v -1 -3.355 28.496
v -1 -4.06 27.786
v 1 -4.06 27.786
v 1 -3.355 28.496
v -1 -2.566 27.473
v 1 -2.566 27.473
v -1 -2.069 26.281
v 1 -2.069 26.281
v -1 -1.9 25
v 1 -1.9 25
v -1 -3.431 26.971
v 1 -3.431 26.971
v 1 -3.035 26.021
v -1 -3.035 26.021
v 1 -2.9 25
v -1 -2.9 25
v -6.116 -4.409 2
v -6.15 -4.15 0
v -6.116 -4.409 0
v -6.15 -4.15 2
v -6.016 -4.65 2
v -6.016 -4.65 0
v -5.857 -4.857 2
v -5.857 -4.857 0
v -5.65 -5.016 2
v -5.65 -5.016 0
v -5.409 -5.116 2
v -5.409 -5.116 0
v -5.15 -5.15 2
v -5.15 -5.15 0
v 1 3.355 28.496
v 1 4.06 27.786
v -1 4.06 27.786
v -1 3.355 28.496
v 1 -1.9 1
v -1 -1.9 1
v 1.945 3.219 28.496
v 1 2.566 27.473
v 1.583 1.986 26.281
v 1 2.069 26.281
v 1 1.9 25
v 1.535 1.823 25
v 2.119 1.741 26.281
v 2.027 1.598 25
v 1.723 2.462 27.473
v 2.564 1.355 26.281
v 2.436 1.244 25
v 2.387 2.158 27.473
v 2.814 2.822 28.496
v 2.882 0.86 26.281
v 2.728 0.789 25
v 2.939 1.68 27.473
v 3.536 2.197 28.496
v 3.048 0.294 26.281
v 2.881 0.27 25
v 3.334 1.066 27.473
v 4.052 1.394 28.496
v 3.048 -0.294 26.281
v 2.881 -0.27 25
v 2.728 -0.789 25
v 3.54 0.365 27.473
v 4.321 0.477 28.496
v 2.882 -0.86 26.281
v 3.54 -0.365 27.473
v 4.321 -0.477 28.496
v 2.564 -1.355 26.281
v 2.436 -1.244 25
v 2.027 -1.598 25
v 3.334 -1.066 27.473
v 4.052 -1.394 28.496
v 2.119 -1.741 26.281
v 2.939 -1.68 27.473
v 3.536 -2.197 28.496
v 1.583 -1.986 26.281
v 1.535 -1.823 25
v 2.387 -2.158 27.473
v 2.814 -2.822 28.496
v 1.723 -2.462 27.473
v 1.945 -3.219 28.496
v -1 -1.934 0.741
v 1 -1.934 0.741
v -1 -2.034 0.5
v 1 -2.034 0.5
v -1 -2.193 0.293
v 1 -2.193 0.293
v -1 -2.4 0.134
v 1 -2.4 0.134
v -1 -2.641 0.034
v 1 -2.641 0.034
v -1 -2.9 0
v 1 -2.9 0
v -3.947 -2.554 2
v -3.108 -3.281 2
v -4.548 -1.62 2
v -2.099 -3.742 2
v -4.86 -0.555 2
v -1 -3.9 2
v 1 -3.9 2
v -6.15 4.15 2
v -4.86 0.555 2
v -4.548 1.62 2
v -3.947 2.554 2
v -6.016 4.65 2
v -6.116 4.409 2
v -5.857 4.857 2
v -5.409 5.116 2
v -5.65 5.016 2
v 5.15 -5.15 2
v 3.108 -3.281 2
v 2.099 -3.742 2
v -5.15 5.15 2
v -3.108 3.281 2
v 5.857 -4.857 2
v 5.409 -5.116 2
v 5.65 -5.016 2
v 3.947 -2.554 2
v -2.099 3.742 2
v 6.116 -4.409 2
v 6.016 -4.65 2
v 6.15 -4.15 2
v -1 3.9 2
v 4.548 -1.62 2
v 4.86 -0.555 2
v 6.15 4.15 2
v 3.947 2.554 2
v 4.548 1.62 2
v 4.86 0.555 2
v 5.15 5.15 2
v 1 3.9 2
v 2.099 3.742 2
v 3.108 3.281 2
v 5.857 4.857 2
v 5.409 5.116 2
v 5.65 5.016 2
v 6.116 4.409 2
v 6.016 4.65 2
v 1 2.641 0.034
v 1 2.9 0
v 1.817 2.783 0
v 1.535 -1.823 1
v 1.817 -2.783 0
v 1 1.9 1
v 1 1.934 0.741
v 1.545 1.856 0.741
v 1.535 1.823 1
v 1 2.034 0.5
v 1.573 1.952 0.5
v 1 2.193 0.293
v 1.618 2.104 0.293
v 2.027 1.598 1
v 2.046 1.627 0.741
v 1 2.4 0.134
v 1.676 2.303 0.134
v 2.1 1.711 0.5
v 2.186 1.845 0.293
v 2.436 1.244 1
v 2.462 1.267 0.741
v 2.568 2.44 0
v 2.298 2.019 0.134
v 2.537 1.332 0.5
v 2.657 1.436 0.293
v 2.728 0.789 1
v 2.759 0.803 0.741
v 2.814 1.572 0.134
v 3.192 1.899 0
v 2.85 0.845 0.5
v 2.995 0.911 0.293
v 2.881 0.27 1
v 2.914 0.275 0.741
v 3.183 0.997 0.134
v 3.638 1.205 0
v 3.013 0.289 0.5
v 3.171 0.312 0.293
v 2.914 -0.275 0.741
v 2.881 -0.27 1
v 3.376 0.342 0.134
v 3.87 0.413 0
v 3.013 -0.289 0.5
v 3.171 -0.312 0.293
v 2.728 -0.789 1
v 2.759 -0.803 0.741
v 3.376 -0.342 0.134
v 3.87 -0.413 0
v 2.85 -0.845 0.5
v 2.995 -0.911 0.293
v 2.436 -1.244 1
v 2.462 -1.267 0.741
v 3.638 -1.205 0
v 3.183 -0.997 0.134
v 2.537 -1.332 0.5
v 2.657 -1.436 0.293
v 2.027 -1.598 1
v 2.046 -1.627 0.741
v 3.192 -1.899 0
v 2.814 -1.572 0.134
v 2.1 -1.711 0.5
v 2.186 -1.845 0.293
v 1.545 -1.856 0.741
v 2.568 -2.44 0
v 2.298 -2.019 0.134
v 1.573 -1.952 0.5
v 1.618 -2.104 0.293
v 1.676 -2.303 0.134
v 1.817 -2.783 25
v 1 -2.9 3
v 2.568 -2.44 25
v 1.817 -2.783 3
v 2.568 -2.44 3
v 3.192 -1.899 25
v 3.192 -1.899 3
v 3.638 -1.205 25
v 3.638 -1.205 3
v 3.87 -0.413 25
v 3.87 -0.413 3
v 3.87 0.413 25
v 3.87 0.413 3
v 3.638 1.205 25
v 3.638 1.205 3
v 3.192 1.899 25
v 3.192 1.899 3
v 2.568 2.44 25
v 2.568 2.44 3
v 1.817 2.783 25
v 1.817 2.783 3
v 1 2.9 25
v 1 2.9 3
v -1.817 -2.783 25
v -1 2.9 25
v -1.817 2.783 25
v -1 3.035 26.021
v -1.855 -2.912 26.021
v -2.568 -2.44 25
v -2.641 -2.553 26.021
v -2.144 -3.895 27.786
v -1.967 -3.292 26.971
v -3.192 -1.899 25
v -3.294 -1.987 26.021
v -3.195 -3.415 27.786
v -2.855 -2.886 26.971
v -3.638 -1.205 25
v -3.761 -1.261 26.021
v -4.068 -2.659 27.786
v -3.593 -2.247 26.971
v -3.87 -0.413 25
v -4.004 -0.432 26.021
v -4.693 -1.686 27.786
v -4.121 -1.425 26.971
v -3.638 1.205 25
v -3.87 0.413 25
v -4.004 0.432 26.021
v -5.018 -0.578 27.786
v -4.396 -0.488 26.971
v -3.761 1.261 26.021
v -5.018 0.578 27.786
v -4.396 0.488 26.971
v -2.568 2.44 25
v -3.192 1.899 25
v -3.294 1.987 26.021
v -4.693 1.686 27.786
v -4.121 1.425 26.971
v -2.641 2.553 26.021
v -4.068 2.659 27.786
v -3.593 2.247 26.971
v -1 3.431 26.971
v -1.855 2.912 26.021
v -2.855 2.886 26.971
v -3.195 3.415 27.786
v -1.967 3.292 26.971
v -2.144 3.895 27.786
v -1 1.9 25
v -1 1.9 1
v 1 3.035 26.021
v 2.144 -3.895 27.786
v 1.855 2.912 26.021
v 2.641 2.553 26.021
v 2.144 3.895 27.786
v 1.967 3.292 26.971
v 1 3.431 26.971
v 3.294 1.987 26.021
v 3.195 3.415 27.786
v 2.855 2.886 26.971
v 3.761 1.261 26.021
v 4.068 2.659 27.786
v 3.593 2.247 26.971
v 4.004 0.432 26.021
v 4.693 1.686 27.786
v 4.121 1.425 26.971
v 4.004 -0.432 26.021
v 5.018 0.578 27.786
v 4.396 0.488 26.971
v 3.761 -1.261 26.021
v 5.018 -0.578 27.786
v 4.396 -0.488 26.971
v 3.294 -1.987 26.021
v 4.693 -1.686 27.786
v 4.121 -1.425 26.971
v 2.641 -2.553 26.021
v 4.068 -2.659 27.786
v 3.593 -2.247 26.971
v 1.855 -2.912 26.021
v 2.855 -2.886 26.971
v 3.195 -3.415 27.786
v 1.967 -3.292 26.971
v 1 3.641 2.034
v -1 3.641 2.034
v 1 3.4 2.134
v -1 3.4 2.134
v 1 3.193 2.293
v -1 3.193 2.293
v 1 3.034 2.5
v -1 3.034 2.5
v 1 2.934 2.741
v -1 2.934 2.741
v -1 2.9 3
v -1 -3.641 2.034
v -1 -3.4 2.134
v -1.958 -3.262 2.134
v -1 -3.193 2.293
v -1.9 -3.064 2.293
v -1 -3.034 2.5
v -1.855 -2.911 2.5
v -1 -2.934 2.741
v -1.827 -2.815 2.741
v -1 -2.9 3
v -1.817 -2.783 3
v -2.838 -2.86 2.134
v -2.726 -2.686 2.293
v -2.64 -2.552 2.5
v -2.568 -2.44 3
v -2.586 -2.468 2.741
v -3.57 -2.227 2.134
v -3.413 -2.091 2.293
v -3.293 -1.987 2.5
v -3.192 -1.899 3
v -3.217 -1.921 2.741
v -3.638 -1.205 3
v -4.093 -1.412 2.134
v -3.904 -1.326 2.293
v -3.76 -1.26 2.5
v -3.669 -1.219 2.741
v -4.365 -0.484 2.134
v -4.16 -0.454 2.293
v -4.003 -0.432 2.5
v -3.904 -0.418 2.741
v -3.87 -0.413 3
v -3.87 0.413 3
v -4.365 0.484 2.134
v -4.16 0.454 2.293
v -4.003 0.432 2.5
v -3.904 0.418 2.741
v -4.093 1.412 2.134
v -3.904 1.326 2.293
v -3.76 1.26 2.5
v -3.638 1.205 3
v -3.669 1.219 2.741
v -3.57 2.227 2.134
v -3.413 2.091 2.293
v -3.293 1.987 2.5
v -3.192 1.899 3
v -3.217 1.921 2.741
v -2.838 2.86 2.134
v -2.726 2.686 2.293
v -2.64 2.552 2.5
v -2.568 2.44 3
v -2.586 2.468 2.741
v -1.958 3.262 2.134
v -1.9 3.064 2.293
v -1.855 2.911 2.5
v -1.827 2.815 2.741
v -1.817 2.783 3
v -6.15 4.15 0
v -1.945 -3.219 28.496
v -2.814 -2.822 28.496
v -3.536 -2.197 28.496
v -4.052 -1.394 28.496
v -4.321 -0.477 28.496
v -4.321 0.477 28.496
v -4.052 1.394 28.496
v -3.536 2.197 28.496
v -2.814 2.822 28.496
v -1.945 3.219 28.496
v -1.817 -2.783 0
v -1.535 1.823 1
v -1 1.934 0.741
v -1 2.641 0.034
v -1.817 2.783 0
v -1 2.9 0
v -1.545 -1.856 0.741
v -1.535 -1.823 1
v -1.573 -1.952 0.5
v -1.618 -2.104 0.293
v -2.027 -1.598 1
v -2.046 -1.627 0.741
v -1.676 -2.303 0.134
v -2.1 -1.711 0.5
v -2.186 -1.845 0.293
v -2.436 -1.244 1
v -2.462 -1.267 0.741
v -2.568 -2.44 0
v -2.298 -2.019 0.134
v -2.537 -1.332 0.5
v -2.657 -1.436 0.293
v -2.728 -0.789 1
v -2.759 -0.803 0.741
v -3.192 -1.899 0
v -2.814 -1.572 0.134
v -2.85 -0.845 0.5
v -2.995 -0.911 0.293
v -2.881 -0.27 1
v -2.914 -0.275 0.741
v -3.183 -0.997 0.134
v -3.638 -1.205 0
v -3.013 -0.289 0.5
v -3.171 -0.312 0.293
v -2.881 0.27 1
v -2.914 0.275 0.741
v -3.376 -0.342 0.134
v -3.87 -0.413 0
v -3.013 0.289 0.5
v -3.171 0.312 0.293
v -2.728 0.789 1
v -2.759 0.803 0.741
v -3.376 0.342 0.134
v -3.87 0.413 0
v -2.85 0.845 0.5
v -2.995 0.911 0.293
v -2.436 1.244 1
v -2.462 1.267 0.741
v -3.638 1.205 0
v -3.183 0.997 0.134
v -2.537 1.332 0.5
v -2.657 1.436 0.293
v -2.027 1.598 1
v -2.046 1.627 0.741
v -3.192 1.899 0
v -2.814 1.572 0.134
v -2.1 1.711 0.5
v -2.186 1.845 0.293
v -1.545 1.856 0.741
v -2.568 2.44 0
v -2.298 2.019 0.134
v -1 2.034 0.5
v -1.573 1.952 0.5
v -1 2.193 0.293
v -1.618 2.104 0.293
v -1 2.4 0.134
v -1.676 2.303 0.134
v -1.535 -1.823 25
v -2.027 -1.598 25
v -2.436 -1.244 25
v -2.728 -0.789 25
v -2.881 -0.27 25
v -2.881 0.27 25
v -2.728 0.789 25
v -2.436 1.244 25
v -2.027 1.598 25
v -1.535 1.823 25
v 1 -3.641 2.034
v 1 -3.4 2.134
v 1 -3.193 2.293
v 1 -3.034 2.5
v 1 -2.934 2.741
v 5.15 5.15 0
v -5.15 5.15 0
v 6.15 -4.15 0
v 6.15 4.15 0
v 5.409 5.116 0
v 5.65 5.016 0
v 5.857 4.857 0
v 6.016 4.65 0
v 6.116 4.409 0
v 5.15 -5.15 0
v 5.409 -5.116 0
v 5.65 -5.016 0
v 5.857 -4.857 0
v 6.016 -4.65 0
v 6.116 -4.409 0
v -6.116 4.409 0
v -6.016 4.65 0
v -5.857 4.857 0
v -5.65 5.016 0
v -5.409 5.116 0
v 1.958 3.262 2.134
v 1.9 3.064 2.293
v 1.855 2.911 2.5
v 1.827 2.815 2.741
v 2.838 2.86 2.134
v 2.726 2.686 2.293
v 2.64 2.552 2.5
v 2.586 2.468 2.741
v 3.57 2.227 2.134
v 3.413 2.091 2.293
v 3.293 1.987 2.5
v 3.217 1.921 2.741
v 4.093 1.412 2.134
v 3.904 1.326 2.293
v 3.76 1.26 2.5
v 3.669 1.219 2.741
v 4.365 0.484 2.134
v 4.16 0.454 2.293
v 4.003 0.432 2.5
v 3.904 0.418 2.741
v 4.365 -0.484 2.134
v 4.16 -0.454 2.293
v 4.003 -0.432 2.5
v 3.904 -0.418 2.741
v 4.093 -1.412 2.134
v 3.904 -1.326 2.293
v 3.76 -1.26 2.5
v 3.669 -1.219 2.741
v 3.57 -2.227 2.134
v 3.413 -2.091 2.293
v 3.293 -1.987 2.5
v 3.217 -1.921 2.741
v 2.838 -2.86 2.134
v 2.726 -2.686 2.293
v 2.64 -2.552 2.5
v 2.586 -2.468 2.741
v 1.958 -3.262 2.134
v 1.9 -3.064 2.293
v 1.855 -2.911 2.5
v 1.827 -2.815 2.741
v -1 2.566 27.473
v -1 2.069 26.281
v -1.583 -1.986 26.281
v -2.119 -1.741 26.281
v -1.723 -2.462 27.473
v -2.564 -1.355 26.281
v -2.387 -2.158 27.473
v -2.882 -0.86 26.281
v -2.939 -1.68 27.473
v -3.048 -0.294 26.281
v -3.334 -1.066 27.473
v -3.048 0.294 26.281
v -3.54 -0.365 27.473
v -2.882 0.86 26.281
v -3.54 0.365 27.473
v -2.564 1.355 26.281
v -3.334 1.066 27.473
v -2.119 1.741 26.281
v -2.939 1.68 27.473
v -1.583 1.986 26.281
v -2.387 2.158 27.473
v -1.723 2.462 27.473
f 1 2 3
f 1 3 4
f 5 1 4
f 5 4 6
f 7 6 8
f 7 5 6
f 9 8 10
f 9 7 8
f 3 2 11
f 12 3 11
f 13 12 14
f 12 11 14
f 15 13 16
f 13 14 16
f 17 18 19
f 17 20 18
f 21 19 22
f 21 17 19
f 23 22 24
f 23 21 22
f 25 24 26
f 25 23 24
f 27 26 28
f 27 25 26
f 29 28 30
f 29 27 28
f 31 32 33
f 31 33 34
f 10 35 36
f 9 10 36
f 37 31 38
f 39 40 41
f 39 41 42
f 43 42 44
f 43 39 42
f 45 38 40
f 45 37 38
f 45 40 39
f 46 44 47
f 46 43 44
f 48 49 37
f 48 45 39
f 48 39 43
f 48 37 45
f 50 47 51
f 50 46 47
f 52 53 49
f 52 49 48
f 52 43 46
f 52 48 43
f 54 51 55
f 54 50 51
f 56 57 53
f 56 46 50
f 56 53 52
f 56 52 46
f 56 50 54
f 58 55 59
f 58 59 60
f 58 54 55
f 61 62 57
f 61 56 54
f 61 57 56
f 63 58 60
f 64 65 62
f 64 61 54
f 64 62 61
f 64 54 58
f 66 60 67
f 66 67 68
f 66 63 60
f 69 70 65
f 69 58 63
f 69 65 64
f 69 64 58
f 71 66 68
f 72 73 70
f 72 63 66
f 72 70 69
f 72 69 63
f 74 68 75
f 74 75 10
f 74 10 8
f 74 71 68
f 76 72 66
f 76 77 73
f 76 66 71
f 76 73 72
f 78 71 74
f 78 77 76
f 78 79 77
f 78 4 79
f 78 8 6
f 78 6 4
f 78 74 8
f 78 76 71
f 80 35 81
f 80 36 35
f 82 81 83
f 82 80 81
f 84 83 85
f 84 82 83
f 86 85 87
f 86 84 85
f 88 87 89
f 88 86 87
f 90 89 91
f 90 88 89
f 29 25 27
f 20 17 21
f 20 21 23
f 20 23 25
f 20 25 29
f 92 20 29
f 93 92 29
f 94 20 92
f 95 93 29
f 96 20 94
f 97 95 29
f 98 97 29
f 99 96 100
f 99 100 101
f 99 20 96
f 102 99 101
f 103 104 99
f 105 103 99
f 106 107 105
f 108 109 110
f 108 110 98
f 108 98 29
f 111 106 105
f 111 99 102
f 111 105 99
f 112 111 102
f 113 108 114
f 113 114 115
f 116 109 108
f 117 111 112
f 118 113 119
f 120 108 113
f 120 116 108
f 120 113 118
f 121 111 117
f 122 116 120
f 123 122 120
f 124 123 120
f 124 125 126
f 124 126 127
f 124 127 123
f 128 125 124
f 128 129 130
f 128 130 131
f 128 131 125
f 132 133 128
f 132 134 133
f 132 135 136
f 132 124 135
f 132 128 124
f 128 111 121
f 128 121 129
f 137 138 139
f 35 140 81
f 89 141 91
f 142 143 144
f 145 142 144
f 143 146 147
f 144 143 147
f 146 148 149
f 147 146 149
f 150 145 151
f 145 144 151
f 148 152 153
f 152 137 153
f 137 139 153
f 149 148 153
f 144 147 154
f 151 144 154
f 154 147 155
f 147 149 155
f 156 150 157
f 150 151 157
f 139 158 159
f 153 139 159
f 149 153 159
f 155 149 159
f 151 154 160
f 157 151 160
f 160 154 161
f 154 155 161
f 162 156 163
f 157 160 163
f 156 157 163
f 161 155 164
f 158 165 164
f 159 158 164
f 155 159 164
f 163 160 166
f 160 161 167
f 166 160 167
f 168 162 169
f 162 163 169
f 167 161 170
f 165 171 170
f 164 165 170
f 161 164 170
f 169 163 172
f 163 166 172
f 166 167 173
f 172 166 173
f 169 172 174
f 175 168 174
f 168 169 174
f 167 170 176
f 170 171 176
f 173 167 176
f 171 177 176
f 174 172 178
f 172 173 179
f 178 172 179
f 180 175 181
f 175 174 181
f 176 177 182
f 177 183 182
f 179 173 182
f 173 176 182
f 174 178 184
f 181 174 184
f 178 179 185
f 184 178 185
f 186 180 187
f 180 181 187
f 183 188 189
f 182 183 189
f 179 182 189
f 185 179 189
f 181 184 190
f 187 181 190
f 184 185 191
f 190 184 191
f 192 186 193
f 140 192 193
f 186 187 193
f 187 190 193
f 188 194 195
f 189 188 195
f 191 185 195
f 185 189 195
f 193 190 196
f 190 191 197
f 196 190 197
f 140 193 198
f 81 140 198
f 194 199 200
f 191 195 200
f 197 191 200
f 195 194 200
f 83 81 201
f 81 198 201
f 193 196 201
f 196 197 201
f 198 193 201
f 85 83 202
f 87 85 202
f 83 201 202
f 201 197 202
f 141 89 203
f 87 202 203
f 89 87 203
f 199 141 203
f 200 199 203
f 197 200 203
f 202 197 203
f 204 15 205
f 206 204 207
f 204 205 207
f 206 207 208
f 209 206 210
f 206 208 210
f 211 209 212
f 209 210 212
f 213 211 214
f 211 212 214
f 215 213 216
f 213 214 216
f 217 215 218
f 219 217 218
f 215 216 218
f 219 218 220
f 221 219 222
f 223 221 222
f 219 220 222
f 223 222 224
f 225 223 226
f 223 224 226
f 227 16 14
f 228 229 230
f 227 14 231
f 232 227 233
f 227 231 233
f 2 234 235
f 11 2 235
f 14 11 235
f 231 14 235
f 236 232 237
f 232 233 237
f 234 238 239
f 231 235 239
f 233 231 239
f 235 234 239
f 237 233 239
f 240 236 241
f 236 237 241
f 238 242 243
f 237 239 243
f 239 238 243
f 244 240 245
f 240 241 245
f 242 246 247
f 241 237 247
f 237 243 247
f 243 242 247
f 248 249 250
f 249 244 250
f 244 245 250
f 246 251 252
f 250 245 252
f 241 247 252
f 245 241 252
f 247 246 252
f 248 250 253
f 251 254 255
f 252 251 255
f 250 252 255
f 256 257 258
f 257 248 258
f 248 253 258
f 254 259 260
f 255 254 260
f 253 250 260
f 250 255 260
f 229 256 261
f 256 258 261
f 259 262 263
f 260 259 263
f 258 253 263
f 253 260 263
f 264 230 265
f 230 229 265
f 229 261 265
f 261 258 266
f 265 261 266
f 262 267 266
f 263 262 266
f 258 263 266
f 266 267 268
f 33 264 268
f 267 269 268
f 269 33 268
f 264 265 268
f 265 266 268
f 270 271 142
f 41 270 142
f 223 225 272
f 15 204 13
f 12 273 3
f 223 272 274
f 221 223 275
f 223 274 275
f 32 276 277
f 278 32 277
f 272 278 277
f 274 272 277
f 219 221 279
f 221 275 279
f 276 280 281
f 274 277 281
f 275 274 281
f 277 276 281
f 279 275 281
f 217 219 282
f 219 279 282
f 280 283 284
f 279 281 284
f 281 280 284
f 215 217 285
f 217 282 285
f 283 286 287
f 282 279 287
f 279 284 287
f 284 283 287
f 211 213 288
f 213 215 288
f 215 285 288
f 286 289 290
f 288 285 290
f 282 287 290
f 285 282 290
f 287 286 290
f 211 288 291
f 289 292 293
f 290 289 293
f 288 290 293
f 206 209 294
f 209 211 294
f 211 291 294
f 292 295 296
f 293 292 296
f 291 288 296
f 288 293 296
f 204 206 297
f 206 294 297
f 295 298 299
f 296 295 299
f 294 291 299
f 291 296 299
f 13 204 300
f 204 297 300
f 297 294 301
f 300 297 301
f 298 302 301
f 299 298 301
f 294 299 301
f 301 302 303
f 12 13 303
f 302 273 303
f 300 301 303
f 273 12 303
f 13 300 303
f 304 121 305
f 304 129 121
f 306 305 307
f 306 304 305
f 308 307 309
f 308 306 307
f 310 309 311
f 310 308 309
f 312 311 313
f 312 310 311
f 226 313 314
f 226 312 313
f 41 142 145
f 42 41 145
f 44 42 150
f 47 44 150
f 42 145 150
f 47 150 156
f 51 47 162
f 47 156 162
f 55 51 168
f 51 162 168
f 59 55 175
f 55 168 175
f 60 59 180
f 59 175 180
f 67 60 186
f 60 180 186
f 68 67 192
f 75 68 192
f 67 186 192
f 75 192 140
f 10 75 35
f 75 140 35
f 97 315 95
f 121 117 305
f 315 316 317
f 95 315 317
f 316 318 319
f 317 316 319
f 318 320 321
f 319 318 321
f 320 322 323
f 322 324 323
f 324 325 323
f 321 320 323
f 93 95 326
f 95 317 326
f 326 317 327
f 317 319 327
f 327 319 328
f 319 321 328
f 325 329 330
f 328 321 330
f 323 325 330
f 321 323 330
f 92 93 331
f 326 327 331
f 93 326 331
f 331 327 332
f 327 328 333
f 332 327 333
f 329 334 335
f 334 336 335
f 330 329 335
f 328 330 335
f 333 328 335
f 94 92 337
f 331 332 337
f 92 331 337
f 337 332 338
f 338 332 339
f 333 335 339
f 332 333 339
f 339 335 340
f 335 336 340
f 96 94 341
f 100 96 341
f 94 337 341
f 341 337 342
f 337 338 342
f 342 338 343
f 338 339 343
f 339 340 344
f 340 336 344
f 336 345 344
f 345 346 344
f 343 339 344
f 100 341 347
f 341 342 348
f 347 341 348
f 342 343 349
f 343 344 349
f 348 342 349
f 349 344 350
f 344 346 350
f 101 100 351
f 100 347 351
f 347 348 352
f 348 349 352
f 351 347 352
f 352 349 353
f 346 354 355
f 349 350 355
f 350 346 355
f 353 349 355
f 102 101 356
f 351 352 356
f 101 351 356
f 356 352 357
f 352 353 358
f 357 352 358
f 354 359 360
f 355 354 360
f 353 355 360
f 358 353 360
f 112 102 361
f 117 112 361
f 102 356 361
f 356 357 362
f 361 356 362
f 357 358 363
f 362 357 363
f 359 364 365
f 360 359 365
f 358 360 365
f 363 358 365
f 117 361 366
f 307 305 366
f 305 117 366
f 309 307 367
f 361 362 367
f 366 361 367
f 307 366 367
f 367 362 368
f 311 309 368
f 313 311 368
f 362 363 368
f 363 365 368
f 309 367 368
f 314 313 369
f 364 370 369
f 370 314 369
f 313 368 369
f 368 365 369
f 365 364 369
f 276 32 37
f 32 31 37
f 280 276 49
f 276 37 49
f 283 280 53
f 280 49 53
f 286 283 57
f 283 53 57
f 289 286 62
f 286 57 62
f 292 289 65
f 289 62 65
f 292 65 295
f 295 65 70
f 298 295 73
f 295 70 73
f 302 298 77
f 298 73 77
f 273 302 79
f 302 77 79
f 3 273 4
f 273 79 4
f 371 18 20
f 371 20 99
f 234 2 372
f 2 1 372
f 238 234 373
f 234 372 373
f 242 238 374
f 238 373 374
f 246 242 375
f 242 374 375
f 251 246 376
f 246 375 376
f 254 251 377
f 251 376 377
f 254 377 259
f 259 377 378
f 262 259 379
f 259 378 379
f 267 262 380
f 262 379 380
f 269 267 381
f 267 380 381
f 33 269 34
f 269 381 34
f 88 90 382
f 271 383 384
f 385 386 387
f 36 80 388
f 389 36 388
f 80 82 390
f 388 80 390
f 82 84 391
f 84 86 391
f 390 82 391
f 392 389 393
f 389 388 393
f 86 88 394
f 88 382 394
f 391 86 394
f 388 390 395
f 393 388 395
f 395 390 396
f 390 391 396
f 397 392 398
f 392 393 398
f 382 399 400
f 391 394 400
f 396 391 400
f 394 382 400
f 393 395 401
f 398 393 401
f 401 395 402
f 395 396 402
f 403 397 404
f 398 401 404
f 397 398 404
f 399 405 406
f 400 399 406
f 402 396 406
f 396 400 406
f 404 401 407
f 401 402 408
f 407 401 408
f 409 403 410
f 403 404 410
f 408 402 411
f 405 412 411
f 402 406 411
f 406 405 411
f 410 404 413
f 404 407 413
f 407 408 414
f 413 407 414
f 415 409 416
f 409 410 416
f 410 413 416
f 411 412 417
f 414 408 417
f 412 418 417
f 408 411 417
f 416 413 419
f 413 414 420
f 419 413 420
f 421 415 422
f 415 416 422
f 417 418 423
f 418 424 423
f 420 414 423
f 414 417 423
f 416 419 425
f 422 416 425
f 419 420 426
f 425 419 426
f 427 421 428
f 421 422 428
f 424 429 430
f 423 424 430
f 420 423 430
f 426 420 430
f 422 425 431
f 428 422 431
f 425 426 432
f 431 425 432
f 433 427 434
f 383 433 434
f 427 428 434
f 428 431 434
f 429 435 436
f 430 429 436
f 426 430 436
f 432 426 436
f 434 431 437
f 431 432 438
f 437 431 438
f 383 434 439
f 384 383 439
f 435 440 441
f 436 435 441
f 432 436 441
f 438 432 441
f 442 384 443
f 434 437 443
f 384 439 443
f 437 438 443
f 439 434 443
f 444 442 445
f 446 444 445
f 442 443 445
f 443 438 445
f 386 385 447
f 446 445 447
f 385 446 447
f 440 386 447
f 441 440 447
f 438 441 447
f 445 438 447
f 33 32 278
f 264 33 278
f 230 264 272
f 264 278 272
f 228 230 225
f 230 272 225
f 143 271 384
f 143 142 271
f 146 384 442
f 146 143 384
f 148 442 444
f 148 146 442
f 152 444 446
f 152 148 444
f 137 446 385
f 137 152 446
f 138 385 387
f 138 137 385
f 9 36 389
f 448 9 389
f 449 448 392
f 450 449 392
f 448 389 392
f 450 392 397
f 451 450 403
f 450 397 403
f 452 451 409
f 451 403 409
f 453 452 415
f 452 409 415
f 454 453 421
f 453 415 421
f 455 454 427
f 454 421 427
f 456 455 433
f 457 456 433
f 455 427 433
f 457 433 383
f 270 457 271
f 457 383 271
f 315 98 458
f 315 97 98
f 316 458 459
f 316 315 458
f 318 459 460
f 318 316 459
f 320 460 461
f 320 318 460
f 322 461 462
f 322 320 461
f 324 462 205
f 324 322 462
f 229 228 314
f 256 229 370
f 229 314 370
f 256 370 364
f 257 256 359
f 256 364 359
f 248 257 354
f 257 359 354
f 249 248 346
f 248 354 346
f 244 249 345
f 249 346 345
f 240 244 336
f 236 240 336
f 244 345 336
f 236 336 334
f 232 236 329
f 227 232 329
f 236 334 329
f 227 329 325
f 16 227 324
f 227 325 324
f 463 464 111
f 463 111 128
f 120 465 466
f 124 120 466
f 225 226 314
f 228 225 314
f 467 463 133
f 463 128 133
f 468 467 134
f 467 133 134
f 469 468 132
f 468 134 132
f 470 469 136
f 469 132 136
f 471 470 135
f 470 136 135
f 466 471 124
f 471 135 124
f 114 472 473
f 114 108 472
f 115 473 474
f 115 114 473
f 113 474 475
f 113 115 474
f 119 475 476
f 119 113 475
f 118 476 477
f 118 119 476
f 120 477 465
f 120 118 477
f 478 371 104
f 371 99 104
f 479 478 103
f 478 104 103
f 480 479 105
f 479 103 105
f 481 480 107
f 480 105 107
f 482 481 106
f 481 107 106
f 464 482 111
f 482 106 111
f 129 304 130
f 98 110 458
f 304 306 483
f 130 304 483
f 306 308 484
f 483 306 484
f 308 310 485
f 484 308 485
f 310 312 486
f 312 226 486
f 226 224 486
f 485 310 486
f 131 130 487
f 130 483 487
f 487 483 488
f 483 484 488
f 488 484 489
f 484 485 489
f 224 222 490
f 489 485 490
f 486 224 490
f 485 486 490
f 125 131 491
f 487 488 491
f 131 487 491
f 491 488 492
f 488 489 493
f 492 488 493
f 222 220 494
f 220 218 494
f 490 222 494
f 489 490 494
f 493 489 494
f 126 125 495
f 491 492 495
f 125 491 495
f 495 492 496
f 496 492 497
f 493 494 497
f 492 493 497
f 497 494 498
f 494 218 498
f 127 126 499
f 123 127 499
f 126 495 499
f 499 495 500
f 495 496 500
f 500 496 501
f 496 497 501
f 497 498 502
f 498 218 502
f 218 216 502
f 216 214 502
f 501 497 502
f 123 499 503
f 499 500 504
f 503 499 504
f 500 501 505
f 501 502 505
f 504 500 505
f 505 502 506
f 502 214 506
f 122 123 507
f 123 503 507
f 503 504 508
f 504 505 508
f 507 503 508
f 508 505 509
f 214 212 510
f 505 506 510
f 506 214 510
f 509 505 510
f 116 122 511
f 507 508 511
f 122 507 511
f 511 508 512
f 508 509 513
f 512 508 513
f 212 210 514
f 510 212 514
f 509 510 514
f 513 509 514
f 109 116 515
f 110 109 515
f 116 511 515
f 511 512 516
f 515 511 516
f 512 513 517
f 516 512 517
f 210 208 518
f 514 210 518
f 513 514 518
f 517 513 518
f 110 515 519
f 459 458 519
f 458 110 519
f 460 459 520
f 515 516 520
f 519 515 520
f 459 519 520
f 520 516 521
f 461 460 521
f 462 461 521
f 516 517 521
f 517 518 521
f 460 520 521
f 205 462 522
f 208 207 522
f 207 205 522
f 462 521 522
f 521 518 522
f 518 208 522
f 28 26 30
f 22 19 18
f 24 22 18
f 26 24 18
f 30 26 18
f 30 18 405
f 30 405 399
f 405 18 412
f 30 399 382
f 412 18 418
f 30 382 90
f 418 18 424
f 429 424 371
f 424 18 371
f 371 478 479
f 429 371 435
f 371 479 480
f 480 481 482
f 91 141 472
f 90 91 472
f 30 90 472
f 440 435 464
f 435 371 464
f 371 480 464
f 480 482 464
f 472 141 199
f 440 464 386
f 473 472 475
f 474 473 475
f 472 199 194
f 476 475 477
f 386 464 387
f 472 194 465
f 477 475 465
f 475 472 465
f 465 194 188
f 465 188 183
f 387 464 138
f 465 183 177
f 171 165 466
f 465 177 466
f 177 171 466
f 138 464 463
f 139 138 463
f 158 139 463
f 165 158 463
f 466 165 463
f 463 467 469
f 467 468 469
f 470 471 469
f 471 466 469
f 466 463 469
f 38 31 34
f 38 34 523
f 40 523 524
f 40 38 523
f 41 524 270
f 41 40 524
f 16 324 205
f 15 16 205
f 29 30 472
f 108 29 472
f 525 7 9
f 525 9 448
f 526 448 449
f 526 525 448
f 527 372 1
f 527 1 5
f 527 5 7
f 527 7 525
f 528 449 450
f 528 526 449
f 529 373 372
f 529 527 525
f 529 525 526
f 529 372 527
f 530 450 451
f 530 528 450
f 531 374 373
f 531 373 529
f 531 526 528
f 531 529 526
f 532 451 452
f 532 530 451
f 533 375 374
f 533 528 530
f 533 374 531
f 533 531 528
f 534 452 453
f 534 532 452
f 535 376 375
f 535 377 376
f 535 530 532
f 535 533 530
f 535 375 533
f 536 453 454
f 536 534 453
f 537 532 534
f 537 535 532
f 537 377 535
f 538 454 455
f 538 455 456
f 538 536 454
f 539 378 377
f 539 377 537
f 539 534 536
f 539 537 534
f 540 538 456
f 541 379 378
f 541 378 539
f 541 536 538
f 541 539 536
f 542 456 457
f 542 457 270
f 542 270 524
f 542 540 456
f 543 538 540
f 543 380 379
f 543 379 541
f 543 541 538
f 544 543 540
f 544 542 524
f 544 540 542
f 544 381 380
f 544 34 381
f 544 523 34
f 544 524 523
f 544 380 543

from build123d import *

# Parameters (mm, degrees)
F0_W     = 12.3
F0_H     = 10.3
F1_DEPTH = 2
F2_DEPTH = 25
F3_R     = 1


with BuildPart() as f1:
    # F0 (on Top) → F1 (new body)
    with BuildSketch(Plane.XY):
        Rectangle(F0_W, F0_H)
        with BuildLine():
            ThreePointArc((1, 2.9), (3.9, 0), (1, -2.9))
            Line((1, -2.9), (-1, -2.9))
            ThreePointArc((-1, -2.9), (-3.9, 0), (-1, 2.9))
            Line((-1, 2.9), (1, 2.9))
        make_face(mode=Mode.SUBTRACT)
    extrude(amount=F1_DEPTH)

    # F0 (on Top) → F2 (join)
    with BuildSketch(Plane.XY):
        with BuildLine():
            Line((-1, -2.9), (1, -2.9))
            ThreePointArc((1, -2.9), (3.9, 0), (1, 2.9))
            Line((1, 2.9), (-1, 2.9))
            ThreePointArc((-1, 2.9), (-3.9, 0), (-1, -2.9))
        make_face()
        with BuildLine():
            ThreePointArc((-1, -1.9), (-2.9, 0), (-1, 1.9))
            Line((-1, 1.9), (1, 1.9))
            ThreePointArc((1, 1.9), (2.9, 0), (1, -1.9))
            Line((1, -1.9), (-1, -1.9))
        make_face(mode=Mode.SUBTRACT)
    extrude(amount=F2_DEPTH)

    # F3
    f3_edges = [f1.edges().sort_by_distance(p)[0] for p in [
        (-3.9, 0, 2),
        (-6.15, 5.15, 1),
        (6.15, 5.15, 1),
        (6.15, -5.15, 1),
        (-6.15, -5.15, 1),
        (2.9, 0, 0),
    ]]
    fillet(f3_edges, radius=F3_R)

    # F5: sweep along a path in F5_path
    with BuildLine(Plane(origin=(-1, 1.9, 25), x_dir=(0, -1, 0), z_dir=(0, 0, -1))) as f5_path:
        Line((0, 0), (0, -2))
        ThreePointArc((0, -2), (1.9, -3.9), (3.8, -2))
        Line((3.8, -2), (3.8, 0))
        ThreePointArc((3.8, 0), (1.9, 1.9), (0, 0))
    # F4 (on Front) → F5 (sweep)
    with BuildSketch(Plane.XZ):
        with BuildLine():
            ThreePointArc((4.3550781059, 28.4958062232), (3.2782925097, 26.8932718666), (2.9, 25))
            Line((2.9, 25), (3.9, 25))
            ThreePointArc((3.9, 25), (4.201510745, 26.5089958069), (5.0597419257, 27.7862648917))
            Line((5.0597419257, 27.7862648917), (4.3550781059, 28.4958062232))
        make_face()
    sweep(path=f5_path.line)


solid = f1.part
